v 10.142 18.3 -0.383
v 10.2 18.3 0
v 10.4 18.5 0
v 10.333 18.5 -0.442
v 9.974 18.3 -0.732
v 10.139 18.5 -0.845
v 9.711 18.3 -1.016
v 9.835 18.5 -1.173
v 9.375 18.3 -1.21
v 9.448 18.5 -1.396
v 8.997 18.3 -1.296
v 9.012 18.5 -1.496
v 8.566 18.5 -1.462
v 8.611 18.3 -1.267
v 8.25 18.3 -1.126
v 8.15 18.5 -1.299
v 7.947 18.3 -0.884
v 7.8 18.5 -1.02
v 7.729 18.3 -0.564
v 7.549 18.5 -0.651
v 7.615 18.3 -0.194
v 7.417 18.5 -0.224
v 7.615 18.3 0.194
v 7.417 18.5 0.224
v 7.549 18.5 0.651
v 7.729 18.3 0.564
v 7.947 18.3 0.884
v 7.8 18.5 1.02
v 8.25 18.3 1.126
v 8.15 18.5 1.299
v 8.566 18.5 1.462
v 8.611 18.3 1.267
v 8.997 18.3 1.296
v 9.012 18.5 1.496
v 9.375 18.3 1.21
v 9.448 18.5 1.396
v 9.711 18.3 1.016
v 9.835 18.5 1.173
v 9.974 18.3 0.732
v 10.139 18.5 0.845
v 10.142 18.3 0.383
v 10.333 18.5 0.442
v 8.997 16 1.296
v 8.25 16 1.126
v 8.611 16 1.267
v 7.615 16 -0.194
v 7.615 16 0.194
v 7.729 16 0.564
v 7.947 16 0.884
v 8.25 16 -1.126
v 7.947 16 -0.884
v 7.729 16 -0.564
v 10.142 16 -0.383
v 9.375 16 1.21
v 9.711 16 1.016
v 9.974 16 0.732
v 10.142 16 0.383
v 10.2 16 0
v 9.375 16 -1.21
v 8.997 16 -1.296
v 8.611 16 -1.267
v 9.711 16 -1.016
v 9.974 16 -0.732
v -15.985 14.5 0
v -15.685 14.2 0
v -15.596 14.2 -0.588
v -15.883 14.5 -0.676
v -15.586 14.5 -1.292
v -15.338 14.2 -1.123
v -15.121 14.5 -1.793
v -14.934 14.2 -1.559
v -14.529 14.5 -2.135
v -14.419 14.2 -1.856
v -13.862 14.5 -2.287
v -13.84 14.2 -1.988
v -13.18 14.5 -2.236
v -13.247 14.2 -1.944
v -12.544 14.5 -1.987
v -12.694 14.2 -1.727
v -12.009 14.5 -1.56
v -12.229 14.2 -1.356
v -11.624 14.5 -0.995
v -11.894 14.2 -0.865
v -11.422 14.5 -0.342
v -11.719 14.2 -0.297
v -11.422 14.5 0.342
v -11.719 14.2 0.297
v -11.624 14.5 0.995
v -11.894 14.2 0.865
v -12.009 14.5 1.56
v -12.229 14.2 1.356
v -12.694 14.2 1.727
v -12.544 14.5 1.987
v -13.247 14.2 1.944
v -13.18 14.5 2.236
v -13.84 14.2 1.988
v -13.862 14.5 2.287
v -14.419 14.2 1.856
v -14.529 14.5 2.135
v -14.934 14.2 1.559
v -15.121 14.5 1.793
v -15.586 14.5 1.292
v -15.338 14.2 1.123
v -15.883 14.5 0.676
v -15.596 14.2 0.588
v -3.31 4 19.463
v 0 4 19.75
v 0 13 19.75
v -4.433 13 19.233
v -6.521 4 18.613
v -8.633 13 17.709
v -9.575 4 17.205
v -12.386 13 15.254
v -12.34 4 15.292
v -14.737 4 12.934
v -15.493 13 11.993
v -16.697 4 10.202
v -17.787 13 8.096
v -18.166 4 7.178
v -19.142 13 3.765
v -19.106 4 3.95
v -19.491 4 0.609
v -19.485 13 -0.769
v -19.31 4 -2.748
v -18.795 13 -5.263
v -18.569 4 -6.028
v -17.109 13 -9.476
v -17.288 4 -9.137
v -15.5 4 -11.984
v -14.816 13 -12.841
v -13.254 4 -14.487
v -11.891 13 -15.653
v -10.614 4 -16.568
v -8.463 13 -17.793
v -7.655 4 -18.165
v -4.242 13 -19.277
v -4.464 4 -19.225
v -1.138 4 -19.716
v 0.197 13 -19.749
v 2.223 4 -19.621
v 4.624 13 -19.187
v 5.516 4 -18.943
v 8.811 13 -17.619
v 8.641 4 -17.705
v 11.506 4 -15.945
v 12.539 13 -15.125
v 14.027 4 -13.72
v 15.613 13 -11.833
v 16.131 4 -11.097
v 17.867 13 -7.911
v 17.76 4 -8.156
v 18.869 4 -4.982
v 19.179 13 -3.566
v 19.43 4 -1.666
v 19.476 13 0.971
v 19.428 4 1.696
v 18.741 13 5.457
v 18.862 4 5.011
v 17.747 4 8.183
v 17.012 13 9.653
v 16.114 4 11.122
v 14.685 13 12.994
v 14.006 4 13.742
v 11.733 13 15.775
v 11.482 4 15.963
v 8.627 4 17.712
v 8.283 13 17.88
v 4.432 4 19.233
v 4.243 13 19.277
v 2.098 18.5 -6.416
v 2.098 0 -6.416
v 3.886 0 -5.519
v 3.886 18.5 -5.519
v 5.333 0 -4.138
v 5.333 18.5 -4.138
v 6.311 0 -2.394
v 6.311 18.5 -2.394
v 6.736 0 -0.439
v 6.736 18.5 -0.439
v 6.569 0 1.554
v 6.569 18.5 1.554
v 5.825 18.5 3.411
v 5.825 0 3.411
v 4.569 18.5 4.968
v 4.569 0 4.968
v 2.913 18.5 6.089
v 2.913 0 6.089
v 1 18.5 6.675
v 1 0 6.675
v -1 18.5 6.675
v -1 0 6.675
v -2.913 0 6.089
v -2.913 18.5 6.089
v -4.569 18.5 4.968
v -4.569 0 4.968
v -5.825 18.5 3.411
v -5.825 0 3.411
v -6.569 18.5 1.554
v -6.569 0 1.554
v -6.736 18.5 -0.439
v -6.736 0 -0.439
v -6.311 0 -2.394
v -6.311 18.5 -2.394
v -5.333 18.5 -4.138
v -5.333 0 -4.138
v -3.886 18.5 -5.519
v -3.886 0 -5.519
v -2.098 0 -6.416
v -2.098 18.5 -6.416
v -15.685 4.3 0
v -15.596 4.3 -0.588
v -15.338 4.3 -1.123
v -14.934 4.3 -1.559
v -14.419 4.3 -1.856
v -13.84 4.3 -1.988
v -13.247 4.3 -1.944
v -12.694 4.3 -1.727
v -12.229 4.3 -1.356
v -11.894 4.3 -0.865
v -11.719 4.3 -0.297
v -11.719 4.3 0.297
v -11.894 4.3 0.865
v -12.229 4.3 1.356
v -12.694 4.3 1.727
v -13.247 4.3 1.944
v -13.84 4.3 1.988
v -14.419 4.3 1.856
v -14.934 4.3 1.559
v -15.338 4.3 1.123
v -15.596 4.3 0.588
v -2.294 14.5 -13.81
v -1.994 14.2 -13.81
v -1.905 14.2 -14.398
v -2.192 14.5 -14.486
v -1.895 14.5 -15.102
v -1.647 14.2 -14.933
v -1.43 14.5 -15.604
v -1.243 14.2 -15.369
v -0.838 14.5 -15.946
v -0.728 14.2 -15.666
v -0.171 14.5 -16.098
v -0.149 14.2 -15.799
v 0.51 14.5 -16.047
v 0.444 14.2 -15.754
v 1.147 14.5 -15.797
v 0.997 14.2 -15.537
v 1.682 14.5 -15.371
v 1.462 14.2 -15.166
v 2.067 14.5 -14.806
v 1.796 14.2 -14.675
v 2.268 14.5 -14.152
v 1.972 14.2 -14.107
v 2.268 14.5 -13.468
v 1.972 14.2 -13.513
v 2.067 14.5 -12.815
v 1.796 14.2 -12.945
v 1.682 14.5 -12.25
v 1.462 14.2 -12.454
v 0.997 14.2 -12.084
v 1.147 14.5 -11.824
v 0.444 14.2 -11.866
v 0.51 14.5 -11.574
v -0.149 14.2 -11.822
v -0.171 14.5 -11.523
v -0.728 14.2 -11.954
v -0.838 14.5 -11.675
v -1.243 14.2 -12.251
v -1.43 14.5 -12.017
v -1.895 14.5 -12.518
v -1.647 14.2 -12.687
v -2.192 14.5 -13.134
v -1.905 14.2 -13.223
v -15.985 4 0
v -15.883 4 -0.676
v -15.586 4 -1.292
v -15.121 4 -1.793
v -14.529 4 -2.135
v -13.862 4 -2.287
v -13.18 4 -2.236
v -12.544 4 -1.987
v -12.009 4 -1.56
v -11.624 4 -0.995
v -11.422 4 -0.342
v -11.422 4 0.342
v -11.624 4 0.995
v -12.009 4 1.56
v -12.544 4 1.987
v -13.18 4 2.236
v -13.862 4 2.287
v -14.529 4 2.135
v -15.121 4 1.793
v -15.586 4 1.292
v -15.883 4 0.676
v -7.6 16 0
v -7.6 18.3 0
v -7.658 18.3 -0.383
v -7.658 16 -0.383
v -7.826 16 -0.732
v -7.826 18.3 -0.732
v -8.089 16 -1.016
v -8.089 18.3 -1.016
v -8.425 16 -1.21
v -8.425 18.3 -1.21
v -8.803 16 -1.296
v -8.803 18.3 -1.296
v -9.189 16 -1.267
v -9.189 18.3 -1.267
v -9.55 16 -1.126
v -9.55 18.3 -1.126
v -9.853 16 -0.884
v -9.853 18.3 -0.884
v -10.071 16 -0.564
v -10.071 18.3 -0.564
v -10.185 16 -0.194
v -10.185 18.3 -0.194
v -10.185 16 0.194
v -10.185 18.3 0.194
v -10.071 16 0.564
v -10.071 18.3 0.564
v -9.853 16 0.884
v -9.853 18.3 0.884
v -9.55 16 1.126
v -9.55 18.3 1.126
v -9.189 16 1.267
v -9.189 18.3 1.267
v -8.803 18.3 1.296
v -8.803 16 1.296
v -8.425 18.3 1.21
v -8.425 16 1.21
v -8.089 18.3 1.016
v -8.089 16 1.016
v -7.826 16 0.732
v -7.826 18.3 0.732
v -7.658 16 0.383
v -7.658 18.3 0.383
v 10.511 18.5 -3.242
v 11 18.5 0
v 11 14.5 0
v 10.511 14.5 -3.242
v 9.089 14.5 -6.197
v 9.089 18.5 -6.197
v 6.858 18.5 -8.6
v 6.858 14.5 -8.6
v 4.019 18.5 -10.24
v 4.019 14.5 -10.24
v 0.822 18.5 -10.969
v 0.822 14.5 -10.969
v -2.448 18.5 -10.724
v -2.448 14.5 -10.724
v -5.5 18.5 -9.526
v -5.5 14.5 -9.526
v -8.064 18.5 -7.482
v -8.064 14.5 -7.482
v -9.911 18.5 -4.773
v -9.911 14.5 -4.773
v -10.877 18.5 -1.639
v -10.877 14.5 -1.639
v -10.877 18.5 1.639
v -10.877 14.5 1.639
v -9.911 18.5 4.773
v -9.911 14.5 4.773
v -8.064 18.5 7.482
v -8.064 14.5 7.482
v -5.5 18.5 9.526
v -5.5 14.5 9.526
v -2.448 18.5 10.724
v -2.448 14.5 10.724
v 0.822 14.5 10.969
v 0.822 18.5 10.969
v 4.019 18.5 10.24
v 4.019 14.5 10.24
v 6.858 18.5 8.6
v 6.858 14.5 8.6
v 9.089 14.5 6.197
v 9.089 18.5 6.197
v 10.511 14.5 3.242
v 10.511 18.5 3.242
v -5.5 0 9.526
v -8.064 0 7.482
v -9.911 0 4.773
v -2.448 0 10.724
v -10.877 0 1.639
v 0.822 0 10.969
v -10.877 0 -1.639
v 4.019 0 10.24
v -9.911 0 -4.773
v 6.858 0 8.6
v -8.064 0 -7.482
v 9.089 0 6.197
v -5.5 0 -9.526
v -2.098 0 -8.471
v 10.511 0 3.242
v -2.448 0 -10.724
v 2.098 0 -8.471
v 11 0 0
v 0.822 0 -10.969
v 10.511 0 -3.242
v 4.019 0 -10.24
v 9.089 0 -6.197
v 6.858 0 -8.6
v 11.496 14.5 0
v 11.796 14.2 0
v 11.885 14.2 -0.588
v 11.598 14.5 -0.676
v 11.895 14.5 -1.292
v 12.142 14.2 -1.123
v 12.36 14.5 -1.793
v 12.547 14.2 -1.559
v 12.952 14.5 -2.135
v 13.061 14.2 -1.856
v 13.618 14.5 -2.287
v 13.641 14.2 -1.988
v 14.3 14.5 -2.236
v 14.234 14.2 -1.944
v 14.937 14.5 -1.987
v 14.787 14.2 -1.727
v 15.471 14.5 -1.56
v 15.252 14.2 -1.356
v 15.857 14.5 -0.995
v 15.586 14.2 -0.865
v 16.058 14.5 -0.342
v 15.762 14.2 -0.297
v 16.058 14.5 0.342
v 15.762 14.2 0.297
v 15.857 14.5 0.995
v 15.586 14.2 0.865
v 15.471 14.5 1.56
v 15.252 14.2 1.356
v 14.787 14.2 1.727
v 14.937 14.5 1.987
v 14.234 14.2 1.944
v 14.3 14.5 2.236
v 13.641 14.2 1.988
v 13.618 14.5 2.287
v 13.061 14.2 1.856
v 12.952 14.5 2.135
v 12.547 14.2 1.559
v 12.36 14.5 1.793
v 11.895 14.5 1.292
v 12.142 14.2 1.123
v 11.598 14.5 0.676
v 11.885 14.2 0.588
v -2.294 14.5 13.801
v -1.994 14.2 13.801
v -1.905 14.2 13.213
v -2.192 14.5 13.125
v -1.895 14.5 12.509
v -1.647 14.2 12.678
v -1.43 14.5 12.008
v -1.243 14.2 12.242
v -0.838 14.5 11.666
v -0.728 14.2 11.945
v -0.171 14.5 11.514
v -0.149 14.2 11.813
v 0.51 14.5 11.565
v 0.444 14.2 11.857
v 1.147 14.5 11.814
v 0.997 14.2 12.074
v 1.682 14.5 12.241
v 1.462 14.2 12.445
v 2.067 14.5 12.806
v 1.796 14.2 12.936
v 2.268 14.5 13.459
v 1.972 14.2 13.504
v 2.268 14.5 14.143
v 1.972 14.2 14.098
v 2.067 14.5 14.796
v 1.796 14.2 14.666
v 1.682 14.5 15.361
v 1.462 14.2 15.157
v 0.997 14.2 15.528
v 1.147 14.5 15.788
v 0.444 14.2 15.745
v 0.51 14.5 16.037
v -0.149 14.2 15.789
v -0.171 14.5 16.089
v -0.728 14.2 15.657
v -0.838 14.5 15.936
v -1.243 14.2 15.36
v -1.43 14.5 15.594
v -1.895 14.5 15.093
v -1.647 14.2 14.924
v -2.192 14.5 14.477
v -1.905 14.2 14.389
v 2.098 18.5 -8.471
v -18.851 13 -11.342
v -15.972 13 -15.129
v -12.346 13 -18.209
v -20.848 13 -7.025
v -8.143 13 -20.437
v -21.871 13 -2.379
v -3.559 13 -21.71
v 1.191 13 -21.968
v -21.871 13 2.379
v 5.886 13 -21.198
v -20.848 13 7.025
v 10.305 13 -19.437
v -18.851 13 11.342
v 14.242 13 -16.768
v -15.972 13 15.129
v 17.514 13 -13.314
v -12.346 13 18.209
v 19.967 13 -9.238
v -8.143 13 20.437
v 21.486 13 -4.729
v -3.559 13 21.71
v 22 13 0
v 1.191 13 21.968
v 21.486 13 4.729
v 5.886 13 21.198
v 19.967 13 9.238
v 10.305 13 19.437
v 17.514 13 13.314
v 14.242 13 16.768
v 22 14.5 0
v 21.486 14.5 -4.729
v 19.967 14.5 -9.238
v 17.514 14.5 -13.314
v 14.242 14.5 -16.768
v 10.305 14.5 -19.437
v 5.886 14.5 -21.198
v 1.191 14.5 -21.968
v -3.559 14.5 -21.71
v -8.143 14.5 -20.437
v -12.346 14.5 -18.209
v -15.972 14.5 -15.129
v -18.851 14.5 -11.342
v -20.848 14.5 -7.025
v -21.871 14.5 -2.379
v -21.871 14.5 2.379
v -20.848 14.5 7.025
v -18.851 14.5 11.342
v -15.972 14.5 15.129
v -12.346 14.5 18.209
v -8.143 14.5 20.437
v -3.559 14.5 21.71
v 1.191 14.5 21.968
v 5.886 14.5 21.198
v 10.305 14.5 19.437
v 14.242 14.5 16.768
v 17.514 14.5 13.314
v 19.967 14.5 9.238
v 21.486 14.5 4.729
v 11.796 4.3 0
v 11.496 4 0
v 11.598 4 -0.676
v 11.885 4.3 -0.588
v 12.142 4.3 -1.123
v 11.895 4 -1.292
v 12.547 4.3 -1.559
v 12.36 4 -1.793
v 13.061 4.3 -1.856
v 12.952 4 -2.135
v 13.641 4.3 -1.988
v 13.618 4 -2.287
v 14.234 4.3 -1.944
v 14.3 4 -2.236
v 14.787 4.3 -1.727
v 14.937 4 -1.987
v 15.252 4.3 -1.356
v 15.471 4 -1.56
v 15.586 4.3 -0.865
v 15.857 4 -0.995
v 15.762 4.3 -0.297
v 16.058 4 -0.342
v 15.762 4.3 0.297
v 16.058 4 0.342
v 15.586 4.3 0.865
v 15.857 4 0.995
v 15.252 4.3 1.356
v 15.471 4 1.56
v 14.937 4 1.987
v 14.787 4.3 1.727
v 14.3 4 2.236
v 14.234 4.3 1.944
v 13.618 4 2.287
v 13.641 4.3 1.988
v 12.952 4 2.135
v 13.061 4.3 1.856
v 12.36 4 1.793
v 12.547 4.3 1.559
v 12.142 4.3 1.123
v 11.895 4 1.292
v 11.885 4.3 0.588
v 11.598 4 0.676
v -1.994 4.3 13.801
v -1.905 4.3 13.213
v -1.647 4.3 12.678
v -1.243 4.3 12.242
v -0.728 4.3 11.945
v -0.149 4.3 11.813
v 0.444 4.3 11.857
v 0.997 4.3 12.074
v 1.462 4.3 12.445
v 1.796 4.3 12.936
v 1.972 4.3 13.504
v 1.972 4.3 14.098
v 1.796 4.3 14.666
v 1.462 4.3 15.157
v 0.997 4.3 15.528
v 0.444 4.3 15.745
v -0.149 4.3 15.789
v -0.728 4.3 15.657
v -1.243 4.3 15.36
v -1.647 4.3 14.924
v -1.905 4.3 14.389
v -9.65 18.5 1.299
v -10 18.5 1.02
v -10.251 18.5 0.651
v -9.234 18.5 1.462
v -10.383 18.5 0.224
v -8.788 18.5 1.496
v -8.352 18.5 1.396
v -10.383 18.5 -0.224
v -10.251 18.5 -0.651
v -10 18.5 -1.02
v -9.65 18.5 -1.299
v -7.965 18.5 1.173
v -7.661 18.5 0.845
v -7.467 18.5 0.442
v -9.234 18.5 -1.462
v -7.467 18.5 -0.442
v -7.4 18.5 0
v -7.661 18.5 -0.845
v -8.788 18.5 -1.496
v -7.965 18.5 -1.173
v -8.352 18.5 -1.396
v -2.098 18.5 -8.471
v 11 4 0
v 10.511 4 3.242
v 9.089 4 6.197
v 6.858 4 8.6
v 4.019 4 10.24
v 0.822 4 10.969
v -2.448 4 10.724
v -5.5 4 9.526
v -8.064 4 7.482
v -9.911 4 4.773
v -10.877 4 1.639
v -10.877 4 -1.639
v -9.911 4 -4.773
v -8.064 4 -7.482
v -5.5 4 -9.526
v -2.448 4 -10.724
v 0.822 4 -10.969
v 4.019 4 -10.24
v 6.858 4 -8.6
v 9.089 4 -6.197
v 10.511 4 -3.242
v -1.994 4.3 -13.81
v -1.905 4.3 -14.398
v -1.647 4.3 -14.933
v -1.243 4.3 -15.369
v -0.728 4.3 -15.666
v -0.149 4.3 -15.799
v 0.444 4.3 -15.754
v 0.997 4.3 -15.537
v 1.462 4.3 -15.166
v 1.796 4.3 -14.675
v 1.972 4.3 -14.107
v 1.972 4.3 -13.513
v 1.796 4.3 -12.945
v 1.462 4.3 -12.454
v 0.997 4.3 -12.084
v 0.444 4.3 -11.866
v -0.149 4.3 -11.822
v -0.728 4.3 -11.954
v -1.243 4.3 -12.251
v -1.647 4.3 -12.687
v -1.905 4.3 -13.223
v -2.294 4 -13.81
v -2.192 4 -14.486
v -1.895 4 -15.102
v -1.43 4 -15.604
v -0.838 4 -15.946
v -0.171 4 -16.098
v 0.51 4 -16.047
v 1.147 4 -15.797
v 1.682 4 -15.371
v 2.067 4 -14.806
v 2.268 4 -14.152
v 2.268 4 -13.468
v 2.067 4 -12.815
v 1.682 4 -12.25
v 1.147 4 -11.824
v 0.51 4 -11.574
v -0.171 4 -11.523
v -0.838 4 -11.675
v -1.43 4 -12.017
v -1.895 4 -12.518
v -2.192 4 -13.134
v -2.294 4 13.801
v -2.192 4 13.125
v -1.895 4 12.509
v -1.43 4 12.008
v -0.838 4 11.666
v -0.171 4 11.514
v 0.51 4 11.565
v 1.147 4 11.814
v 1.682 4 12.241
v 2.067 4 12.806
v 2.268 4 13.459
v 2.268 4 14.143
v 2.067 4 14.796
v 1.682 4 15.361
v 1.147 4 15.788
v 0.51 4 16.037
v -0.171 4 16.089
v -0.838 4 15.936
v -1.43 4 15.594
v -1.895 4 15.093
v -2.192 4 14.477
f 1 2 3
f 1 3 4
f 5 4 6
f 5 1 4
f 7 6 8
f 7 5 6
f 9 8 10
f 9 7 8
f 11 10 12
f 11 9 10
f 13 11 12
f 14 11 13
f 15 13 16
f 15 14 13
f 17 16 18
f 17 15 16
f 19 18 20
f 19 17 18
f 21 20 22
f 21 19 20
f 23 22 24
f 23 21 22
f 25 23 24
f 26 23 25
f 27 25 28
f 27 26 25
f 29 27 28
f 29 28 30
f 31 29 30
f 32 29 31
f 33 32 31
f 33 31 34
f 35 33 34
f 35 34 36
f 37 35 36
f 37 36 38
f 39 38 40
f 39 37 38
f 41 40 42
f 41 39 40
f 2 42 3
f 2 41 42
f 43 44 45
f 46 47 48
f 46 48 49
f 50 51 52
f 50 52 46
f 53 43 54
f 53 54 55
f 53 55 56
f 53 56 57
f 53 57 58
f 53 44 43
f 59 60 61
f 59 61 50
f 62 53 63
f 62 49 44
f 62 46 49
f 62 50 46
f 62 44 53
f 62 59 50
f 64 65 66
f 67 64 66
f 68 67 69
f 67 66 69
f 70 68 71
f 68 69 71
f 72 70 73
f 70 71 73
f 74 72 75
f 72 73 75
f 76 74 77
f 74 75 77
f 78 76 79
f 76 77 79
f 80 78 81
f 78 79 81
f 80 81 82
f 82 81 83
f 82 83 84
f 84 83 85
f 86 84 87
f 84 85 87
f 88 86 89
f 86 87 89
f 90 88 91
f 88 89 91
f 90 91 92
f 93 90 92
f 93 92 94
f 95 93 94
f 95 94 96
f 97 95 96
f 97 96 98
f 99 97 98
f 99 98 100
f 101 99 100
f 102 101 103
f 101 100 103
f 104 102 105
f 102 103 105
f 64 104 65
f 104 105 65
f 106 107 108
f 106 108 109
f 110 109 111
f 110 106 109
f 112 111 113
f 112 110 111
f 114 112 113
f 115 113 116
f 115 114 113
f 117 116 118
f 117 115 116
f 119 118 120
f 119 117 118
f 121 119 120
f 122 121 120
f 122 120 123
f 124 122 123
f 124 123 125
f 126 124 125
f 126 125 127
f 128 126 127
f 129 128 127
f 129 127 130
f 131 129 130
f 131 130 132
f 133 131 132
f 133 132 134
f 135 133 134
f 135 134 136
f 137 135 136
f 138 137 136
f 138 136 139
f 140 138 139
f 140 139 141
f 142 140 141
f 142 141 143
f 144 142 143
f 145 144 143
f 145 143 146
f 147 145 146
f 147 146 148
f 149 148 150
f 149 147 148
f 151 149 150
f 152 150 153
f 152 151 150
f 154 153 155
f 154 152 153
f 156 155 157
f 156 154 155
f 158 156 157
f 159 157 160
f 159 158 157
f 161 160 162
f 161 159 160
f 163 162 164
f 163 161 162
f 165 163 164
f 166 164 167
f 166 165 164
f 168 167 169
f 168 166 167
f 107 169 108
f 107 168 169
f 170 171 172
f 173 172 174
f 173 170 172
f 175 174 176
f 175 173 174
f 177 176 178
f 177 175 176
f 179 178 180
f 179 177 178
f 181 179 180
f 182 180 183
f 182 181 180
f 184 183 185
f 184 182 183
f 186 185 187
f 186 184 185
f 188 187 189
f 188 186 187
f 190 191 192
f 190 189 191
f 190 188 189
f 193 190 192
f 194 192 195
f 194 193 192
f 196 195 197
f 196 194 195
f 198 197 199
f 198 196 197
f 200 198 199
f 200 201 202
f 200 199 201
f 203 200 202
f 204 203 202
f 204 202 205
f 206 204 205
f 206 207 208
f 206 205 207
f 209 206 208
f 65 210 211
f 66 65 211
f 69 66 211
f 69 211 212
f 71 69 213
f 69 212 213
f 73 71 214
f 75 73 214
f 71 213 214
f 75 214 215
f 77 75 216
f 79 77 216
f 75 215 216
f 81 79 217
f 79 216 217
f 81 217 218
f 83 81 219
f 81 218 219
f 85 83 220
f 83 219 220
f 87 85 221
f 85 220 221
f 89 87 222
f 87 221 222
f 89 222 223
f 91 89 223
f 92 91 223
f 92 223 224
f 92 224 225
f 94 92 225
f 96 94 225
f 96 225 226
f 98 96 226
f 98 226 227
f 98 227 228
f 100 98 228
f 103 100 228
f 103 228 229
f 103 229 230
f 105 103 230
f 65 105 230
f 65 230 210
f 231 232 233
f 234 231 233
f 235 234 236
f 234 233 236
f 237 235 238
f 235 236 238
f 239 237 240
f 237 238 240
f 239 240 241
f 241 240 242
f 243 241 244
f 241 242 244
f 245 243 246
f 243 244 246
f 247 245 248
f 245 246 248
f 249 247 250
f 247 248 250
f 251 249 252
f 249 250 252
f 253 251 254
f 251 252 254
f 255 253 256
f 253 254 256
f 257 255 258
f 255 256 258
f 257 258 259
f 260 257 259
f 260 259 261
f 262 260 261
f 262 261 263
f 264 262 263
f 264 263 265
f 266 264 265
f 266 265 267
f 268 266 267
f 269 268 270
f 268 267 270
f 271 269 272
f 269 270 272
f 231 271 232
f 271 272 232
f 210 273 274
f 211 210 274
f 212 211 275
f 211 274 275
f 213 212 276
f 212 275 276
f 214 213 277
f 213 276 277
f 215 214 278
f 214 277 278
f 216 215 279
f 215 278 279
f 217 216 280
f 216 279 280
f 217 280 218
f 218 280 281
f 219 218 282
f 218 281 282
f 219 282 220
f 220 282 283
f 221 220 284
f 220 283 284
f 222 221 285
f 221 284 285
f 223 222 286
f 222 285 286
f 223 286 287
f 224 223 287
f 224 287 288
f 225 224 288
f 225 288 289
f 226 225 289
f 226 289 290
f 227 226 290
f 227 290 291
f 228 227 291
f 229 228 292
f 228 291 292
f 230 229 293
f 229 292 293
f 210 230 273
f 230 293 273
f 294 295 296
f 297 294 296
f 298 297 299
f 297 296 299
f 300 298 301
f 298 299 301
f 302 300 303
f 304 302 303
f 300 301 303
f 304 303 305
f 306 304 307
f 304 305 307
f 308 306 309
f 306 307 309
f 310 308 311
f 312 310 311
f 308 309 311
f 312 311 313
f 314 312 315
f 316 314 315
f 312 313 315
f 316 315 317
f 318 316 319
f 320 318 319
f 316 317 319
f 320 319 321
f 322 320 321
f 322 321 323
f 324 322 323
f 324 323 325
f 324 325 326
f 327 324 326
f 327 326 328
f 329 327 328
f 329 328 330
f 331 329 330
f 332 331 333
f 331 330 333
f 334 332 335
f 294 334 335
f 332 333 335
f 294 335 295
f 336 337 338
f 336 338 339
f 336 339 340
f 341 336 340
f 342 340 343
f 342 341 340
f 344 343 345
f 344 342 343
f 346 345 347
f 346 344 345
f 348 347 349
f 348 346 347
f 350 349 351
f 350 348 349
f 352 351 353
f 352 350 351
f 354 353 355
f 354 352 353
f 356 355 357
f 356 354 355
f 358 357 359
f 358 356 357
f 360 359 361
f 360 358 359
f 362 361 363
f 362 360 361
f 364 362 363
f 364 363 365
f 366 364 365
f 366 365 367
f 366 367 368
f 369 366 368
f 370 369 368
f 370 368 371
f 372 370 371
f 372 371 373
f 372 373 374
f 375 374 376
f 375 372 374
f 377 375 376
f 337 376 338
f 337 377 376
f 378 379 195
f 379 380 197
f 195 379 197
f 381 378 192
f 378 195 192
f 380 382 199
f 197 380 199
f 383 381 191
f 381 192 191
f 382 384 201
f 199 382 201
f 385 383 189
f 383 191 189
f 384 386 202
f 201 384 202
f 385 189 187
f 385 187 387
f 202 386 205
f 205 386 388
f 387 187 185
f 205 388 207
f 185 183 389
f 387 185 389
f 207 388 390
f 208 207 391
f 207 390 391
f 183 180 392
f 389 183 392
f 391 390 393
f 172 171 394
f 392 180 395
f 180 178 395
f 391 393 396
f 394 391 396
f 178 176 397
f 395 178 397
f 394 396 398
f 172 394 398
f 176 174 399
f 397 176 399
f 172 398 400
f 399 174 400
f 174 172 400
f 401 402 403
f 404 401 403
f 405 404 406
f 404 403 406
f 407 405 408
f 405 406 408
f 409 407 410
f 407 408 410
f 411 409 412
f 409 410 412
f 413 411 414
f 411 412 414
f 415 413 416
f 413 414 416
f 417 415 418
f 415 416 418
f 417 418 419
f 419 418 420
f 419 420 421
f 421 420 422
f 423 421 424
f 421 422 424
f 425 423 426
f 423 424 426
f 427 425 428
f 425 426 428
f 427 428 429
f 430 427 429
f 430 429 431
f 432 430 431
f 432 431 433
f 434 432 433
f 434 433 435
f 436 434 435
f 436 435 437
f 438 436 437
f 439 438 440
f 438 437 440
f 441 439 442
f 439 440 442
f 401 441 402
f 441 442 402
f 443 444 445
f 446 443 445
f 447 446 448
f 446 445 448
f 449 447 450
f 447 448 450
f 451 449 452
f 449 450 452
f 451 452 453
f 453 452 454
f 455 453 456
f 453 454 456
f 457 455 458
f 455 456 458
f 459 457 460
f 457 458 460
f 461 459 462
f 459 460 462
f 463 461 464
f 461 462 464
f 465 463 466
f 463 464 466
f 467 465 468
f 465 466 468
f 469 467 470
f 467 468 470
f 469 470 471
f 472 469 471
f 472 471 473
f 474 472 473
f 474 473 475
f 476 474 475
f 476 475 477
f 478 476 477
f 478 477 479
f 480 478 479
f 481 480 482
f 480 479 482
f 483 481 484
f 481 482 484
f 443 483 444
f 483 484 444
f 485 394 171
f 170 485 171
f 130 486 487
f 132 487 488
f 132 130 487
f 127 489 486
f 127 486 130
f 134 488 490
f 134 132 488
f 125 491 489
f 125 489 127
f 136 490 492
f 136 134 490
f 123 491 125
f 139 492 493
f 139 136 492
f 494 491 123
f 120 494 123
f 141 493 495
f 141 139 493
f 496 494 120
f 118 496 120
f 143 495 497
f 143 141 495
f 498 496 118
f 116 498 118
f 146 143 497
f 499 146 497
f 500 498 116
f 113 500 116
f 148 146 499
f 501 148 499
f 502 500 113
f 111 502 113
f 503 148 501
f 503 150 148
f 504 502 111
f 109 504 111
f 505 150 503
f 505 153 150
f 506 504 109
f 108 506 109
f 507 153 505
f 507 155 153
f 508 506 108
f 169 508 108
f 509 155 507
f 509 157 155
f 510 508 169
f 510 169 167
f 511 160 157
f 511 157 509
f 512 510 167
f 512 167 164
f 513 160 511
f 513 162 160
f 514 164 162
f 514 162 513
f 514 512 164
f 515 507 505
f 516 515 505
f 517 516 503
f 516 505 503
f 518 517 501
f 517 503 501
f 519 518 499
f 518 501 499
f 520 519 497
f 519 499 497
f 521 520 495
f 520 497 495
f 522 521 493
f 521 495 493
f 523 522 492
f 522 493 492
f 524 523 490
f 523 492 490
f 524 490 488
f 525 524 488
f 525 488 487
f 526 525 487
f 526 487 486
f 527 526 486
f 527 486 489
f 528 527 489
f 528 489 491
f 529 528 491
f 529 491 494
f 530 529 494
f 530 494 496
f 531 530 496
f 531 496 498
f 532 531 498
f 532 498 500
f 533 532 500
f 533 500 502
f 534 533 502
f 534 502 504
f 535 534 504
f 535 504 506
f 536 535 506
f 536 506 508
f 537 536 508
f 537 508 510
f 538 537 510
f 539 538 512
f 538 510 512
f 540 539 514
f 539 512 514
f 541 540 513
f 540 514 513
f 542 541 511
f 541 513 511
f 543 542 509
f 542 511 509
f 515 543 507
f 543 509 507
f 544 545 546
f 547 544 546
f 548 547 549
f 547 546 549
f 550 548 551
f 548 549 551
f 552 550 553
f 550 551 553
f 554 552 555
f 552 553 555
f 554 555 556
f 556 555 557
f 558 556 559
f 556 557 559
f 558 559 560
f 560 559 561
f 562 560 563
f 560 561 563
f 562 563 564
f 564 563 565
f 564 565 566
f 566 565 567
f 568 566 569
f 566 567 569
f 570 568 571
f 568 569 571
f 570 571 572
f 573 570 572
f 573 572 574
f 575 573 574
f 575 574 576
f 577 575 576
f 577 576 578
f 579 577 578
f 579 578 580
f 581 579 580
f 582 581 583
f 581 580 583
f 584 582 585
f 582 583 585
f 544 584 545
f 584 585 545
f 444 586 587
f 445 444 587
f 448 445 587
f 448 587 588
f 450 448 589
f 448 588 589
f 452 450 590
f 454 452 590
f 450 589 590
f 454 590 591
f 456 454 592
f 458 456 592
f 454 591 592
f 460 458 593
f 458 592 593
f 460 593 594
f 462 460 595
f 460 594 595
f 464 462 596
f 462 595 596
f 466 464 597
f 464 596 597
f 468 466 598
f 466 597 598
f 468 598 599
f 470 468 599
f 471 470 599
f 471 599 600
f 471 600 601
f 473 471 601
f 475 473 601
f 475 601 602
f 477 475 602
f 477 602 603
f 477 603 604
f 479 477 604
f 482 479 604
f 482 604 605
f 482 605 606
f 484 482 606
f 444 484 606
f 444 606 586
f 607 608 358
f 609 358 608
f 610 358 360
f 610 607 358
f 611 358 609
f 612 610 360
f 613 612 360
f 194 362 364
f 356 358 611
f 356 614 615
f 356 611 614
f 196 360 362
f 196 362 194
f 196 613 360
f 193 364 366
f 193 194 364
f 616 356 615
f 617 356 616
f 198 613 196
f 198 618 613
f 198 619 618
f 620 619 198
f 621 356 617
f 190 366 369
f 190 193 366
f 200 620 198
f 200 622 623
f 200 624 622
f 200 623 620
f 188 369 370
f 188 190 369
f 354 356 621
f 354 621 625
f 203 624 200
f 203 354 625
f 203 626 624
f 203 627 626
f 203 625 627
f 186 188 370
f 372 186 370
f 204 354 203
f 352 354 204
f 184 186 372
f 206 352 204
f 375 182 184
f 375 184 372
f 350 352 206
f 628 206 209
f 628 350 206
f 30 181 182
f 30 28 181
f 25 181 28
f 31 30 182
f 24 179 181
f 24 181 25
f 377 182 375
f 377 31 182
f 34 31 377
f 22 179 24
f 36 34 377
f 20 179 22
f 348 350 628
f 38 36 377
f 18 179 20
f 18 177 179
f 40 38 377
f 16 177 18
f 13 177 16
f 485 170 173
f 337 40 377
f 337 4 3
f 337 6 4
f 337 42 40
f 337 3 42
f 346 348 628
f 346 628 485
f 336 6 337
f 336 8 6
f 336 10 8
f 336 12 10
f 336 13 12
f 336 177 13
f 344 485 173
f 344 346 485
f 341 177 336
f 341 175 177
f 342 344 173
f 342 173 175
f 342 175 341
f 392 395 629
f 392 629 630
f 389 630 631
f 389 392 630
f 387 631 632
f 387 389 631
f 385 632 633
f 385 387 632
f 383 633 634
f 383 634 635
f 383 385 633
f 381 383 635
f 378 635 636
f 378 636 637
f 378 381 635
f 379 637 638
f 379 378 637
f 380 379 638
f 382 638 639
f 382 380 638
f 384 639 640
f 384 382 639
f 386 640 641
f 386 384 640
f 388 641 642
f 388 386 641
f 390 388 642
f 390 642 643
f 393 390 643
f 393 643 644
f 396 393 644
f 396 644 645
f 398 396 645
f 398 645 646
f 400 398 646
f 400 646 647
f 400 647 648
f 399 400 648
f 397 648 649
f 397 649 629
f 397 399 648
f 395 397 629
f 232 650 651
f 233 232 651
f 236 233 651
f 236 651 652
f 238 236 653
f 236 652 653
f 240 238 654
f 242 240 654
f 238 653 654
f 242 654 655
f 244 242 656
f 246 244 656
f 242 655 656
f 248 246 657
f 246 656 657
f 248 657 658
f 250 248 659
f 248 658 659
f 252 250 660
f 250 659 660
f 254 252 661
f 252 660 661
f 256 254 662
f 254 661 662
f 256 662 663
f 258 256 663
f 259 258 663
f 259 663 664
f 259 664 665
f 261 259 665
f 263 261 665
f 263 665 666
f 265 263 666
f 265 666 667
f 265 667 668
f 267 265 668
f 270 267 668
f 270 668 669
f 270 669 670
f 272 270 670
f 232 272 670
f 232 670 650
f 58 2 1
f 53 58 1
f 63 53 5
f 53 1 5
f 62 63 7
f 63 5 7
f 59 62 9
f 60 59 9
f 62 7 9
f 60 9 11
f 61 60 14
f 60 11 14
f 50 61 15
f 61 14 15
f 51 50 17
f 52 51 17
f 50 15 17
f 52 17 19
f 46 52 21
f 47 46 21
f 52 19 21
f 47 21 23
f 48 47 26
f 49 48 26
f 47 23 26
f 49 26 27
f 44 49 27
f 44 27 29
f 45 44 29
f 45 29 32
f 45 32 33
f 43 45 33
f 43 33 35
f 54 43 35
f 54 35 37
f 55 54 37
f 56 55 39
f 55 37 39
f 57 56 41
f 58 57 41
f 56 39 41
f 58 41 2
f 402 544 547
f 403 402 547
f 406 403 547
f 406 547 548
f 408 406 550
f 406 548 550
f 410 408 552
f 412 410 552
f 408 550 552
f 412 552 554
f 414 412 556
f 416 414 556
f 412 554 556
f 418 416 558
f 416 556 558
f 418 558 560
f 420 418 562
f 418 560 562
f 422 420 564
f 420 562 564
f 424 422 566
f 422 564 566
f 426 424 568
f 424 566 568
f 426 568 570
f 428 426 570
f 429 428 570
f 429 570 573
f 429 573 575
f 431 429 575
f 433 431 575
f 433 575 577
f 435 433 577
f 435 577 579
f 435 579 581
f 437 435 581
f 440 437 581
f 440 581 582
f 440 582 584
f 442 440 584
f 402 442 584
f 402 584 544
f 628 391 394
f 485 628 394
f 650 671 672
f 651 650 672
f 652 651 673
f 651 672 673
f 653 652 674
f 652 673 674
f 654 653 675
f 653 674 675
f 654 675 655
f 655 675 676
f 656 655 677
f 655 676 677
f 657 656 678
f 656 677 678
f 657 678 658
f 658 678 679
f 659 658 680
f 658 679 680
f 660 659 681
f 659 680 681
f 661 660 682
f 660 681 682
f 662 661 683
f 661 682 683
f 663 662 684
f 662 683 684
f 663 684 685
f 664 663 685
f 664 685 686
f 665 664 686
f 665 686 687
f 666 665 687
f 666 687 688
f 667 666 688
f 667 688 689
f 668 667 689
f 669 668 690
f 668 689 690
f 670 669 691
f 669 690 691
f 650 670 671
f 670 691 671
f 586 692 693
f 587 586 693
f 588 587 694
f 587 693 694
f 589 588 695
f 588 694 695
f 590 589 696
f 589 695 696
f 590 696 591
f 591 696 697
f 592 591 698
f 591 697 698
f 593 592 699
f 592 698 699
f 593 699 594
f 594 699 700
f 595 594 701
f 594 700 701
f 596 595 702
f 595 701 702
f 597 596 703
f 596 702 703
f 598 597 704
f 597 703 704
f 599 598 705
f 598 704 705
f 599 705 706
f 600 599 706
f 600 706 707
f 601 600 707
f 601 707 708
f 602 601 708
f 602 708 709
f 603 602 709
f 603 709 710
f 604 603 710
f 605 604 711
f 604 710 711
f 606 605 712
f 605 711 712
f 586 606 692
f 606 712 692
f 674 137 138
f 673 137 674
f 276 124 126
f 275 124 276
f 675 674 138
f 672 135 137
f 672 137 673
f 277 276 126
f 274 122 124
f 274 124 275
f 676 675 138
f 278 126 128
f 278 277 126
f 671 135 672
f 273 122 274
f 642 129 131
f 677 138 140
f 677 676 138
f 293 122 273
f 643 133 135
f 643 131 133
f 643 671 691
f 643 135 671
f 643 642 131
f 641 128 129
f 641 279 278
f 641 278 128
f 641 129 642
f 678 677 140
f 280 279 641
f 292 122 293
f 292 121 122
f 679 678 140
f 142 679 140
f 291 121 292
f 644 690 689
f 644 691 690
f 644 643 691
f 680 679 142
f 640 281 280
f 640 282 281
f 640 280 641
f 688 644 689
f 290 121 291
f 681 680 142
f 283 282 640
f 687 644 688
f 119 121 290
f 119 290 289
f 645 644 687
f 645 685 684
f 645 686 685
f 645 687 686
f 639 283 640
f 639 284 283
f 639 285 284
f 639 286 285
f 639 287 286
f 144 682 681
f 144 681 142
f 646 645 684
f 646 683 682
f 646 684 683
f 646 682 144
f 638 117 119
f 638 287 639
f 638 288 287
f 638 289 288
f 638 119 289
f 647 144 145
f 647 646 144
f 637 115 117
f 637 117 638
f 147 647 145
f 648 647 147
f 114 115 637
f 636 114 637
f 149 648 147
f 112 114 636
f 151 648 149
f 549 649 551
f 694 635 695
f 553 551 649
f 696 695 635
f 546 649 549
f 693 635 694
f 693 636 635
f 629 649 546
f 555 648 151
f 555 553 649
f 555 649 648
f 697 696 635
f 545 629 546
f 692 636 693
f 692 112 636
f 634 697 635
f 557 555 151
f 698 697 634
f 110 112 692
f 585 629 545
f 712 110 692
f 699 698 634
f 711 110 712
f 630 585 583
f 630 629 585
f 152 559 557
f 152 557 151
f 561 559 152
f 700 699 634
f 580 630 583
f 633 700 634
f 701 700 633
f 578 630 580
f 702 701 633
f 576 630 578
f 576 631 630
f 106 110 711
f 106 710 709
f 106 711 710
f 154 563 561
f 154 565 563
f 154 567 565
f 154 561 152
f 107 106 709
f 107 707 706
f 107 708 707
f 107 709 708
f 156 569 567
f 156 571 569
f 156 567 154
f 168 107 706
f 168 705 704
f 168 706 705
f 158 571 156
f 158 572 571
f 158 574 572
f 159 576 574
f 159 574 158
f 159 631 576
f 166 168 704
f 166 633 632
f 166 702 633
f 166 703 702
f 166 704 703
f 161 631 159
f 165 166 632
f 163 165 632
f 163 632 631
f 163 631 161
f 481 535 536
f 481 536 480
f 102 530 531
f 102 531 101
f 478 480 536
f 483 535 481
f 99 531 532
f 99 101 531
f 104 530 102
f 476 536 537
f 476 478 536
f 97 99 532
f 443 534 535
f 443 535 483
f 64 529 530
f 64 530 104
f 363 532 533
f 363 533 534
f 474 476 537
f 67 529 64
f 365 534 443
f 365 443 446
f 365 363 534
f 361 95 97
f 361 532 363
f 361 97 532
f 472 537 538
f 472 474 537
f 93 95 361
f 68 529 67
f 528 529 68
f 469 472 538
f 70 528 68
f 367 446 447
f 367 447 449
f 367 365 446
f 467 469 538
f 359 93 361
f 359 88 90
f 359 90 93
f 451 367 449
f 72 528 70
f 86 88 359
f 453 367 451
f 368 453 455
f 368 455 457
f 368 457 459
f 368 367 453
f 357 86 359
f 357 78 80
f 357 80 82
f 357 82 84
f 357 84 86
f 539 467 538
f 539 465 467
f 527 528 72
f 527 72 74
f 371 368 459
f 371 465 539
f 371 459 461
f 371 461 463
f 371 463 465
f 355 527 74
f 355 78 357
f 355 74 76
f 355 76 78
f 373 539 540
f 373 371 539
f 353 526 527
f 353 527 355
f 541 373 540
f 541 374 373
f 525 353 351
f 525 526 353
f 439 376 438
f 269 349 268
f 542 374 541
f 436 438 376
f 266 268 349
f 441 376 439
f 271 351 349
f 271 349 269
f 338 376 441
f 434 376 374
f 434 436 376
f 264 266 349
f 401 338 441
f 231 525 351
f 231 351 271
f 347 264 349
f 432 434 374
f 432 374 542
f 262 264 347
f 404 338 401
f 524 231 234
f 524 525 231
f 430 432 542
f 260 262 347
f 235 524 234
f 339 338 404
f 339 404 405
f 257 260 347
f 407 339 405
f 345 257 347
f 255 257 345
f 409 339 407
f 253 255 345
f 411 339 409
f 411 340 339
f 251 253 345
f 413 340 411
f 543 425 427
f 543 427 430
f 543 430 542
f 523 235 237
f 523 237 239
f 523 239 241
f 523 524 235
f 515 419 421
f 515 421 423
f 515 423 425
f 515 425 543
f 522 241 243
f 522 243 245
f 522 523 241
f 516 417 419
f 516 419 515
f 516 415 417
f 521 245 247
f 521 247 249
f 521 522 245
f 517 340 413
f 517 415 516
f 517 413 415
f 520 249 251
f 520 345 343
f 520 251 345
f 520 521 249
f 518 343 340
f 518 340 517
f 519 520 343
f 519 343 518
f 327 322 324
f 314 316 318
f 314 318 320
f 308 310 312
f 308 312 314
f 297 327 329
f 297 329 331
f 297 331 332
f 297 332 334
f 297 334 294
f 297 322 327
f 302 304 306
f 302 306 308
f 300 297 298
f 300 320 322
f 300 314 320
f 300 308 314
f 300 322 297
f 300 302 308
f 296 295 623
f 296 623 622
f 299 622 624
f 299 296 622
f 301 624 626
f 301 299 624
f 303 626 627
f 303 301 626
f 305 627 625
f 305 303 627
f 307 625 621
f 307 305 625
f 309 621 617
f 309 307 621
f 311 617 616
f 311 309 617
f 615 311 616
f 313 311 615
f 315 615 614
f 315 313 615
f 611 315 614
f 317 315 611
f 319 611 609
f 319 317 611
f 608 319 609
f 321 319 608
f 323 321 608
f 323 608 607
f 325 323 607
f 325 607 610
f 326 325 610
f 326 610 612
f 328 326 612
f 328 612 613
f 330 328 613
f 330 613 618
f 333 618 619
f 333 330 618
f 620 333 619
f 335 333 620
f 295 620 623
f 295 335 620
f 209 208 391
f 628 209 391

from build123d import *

# Parameters (mm, degrees)
SKETCH_1_R          = 22
EXTRUDE_1_DEPTH     = 18.5
SKETCH_2_R          = 22
SKETCH_2_R_2        = 11
CUT_EXTRUDE_1_DEPTH = 4
SKETCH_4_R          = 22
SKETCH_4_RX         = 19.75
SKETCH_4_RY         = 19.5
CUT_EXTRUDE_2_DEPTH = 13
SKETCH_5_R          = 21.651989758
SKETCH_5_R_2        = 11
CUT_EXTRUDE_3_DEPTH = 4
CUT_EXTRUDE_4_DEPTH = 19.5
HOLE_WIZARD_1_1_D   = 3.9878
SKETCH_33_R         = 1.3
CUT_EXTRUDE_5_DEPTH = 2.5
CHAMFER_1_SIZE      = 0.3
CHAMFER_2_SIZE      = 0.2


with BuildPart() as part:
    # 草图1 → 凸台-拉伸1 (new body)
    with BuildSketch(Plane(origin=(0, 0, 0), x_dir=(1, 0, 0), z_dir=(0, 1, 0))):
        Circle(SKETCH_1_R)
    extrude(amount=EXTRUDE_1_DEPTH)

    # 草图2 → 切除-拉伸1 (cut)
    with BuildSketch(Plane(origin=(0, 18.5, 0), x_dir=(1, 0, 0), z_dir=(0, 1, 0))):
        Circle(SKETCH_2_R)
        Circle(SKETCH_2_R_2, mode=Mode.SUBTRACT)
    extrude(amount=-CUT_EXTRUDE_1_DEPTH, mode=Mode.SUBTRACT)

    # 草图4 → 切除-拉伸2 (cut)
    with BuildSketch(Plane.XZ):
        Circle(SKETCH_4_R)
        with Locations(Location((0, 0), (0, 0, 90))):
            Ellipse(SKETCH_4_RX, SKETCH_4_RY, mode=Mode.SUBTRACT)
    extrude(amount=-CUT_EXTRUDE_2_DEPTH, mode=Mode.SUBTRACT)

    # 草图5 → 切除-拉伸3 (cut)
    with BuildSketch(Plane.XZ):
        Circle(SKETCH_5_R)
        Circle(SKETCH_5_R_2, mode=Mode.SUBTRACT)
    extrude(amount=-CUT_EXTRUDE_3_DEPTH, mode=Mode.SUBTRACT)

    # 草图6 → 切除-拉伸4 (cut, through all)
    with BuildSketch(Plane(origin=(0, 18.5, 0), x_dir=(1, 0, 0), z_dir=(0, 1, 0))):
        with BuildLine():
            Line((-2.097599684, 8.471245207), (2.097599684, 8.471245207))
            Line((2.097599684, 8.471245207), (2.097599684, 6.415806697))
            ThreePointArc((2.097599684, 6.415806697), (0, -6.75), (-2.097599684, 6.415806697))
            Line((-2.097599684, 6.415806697), (-2.097599684, 8.471245207))
        make_face()
    extrude(amount=-CUT_EXTRUDE_4_DEPTH, mode=Mode.SUBTRACT)

    # #1 螺旋的螺纹孔钻头1 (through all)
    with Locations(Plane(origin=(0, 14.5, 0), x_dir=(1, 0, 0), z_dir=(0, 1, 0))):
        with Locations((0, 13.810288315), (-85.484743378, -69.881752856), (13.789919005, 0), (0, -13.801039256), (-13.69075507, 0)):
            Hole(HOLE_WIZARD_1_1_D / 2)

    # 草图33 → 切除-拉伸5 (cut)
    with BuildSketch(Plane(origin=(0, 18.5, 0), x_dir=(1, 0, 0), z_dir=(0, 1, 0))):
        with Locations((8.9, 0)):
            Circle(SKETCH_33_R)
        with Locations((-8.9, 0)):
            Circle(SKETCH_33_R)
    extrude(amount=-CUT_EXTRUDE_5_DEPTH, mode=Mode.SUBTRACT)

    # 倒角1
    chamfer_1_edges = [part.edges().sort_by_distance(p)[0] for p in [
        (-11.69685507, 4, 0),
        (-11.69685507, 14.5, 0),
        (1.9939, 4, 13.801039256),
        (1.9939, 14.5, 13.801039256),
        (15.783819005, 4, 0),
        (15.783819005, 14.5, 0),
        (1.9939, 4, -13.810288315),
        (1.9939, 14.5, -13.810288315),
    ]]
    chamfer(chamfer_1_edges, length=CHAMFER_1_SIZE)

    # 倒角2
    chamfer_2_edges = [part.edges().sort_by_distance(p)[0] for p in [
        (7.6, 18.5, 0),
        (-10.2, 18.5, 0),
    ]]
    chamfer(chamfer_2_edges, length=CHAMFER_2_SIZE)


solid = part.part
